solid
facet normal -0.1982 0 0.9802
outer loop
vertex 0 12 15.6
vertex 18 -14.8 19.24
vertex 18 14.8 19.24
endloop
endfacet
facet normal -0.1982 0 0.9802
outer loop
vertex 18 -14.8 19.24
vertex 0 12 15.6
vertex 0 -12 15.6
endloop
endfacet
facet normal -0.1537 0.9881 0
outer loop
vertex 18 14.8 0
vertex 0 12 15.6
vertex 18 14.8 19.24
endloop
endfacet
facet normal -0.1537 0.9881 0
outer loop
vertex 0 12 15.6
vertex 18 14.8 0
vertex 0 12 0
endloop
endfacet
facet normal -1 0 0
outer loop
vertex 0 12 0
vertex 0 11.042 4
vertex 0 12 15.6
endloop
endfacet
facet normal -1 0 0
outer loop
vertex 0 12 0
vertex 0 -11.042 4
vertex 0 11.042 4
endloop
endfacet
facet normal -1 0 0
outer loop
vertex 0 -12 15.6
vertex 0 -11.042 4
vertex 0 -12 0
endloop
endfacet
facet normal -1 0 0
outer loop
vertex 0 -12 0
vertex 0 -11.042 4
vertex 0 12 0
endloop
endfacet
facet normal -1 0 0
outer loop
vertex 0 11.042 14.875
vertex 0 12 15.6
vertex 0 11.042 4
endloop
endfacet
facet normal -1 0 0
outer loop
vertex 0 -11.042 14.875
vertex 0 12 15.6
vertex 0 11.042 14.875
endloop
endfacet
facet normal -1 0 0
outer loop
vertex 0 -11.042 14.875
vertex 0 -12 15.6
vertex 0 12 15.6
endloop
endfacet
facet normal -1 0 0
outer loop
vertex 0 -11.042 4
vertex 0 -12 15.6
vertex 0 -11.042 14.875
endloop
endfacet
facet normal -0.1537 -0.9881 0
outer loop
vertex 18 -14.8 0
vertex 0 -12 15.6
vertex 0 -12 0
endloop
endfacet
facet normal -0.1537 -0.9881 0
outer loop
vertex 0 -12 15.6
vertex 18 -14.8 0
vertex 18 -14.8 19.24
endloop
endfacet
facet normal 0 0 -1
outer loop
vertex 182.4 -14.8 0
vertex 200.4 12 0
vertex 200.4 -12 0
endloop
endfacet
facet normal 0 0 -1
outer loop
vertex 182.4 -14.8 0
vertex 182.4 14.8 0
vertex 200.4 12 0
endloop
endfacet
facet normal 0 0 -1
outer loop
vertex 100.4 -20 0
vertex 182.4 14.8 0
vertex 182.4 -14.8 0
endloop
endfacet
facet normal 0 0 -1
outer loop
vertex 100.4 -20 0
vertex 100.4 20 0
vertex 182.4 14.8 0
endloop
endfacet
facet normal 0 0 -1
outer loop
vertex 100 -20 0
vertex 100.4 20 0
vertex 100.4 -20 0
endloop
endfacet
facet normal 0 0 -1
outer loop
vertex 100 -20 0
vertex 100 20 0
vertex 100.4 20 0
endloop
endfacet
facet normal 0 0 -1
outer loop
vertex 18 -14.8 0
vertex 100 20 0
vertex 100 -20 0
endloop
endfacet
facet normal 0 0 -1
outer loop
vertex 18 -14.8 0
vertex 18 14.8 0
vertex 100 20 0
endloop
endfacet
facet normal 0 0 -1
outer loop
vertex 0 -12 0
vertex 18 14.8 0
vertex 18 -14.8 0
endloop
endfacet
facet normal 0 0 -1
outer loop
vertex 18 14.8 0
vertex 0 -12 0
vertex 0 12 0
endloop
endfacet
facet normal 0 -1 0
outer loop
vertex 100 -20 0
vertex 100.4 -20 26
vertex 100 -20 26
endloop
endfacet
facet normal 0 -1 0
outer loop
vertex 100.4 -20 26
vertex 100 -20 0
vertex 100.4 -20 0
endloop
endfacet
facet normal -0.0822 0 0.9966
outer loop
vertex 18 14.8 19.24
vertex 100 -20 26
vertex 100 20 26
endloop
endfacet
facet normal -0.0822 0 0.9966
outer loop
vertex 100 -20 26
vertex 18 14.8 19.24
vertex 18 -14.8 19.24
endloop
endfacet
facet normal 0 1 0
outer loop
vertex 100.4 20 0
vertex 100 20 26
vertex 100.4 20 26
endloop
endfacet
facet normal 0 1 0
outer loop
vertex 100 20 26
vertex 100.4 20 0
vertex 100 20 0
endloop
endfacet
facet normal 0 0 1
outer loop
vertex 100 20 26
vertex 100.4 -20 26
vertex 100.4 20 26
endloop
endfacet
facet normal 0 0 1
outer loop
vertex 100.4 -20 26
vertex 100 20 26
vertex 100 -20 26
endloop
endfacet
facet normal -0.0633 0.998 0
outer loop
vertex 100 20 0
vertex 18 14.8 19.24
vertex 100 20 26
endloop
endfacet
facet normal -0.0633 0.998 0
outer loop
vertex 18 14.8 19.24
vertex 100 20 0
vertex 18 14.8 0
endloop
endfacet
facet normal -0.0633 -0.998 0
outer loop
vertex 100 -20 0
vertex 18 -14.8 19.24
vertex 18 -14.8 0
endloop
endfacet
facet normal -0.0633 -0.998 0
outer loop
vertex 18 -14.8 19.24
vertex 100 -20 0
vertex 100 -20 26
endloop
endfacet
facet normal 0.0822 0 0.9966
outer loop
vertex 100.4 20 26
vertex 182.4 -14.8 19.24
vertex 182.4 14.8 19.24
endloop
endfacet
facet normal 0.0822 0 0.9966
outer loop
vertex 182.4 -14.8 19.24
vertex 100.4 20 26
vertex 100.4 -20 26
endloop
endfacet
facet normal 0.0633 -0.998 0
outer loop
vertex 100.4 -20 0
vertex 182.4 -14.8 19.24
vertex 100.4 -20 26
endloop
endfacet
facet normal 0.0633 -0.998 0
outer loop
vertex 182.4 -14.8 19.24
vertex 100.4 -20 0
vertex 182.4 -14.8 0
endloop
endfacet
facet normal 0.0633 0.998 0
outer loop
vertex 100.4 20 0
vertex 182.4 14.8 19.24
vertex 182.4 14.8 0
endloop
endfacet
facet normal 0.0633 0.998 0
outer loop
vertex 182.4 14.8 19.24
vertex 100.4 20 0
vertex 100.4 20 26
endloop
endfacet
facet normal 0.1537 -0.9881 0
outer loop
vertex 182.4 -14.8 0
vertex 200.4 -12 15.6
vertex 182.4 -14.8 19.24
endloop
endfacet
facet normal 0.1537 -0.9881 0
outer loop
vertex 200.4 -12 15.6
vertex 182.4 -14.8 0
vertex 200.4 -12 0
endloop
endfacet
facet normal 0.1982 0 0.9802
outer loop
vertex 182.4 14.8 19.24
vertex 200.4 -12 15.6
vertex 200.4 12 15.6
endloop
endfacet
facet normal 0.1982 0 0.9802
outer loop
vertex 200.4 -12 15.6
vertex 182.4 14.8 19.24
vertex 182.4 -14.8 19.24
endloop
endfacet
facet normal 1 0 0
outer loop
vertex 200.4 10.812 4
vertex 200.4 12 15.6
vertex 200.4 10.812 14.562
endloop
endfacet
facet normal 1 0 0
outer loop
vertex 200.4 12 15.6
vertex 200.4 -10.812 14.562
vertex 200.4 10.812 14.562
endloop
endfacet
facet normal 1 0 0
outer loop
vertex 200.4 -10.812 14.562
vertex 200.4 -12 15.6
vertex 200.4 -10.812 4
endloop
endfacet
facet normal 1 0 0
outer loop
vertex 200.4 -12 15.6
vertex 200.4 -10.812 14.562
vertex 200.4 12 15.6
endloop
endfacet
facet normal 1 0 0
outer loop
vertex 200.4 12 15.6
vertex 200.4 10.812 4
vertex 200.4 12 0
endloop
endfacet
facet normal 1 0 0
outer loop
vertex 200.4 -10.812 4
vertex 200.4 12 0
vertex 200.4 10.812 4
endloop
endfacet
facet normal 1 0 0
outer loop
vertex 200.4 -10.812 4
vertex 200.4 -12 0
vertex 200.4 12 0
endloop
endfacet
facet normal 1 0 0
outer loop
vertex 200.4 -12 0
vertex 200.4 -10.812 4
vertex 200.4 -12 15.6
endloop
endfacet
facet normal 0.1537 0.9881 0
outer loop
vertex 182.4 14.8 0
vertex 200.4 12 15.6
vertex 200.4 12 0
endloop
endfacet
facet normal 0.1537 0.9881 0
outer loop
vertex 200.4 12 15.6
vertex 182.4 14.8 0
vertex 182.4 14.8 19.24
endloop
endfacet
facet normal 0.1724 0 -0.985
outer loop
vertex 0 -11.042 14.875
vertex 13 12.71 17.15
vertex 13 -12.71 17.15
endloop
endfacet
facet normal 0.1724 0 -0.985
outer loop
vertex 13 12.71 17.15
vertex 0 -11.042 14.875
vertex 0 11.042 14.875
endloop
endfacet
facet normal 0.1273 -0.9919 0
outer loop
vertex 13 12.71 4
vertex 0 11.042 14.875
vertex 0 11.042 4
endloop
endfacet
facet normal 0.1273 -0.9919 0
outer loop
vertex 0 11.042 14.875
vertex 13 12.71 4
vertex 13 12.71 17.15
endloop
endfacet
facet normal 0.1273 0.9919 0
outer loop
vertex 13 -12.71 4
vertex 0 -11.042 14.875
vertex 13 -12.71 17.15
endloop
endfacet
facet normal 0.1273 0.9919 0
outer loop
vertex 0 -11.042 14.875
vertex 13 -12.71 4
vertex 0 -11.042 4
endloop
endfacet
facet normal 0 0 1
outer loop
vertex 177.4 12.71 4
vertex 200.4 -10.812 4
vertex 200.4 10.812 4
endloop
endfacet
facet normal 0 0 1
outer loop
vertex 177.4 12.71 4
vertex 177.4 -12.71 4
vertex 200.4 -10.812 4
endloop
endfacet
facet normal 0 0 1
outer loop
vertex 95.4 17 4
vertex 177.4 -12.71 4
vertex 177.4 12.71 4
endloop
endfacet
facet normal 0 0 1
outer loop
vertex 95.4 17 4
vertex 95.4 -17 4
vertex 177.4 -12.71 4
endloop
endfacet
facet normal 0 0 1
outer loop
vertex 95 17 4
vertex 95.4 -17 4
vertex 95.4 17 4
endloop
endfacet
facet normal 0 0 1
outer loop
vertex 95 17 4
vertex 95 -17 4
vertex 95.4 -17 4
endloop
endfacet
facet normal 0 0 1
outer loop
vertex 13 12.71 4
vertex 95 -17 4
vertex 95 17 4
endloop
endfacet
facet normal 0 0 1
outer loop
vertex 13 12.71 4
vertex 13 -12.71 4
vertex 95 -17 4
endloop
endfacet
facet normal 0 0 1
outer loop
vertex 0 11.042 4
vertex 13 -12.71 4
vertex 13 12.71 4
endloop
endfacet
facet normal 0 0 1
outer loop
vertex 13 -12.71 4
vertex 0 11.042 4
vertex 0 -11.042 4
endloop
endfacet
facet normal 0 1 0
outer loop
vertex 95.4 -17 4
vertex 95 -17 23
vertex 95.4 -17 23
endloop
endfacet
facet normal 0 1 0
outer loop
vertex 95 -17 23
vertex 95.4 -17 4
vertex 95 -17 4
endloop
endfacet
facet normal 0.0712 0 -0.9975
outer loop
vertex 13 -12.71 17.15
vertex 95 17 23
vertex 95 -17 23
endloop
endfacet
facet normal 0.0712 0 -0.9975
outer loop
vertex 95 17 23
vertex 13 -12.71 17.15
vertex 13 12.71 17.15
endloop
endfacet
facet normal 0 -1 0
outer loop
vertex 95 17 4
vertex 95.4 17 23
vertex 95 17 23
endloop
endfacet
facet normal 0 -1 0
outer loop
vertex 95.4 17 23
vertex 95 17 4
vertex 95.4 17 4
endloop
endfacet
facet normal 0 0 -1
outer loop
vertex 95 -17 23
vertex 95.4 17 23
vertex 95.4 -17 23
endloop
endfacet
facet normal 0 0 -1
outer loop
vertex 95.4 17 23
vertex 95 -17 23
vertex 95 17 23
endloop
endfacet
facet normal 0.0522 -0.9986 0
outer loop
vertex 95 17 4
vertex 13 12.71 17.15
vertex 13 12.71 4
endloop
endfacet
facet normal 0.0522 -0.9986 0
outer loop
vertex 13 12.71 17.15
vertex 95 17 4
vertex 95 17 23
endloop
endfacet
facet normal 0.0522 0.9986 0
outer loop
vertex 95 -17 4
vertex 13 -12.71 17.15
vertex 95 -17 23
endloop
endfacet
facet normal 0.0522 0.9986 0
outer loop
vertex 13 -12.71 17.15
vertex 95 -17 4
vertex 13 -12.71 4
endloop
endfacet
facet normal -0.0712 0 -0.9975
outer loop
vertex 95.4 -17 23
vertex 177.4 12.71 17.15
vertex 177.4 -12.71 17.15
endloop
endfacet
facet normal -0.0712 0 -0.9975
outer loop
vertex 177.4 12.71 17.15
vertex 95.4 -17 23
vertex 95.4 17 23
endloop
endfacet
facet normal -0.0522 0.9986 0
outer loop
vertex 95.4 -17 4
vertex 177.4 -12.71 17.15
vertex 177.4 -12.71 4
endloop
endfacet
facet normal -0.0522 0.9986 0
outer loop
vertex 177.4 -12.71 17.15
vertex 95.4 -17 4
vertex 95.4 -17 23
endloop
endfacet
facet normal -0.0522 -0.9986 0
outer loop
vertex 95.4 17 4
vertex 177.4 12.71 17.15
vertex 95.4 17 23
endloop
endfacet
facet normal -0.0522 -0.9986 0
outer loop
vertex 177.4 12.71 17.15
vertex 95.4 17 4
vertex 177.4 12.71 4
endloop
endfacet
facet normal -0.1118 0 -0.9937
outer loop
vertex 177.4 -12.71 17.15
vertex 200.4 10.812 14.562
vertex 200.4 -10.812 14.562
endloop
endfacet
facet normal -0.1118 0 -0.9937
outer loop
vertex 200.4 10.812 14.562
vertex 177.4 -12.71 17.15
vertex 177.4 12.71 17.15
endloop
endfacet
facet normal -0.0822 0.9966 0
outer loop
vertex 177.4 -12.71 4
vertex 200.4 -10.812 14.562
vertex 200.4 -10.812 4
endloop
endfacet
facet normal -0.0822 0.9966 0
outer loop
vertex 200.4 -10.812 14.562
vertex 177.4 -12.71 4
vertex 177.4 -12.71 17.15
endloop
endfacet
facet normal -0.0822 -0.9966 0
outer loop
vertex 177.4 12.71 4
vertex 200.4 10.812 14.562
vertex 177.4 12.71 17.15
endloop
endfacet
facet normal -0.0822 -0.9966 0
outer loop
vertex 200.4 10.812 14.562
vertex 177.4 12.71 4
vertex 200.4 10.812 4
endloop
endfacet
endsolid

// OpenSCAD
$fn = 32;

// ----------------------------------------------------------------------
// Faired channel: 200 x 40 x 26 mm, 3 mm walls, faired ends
// ----------------------------------------------------------------------

// --- parameters (mm) ---
length = 200;             // channel length
width = 40;               // channel width at mid length
height = 26;              // channel height at mid length
wall = 3;                 // side wall thickness
floor_t = 4;              // floor thickness
end_w = 24;               // faired end width
end_h = 15.6;             // faired end height

difference() {
  union() {
    hull() {
      translate([0, -12, 0]) cube([0.4, 24, 15.6]);
      translate([18, -14.8, 0]) cube([0.4, 29.6, 19.24]);
    }
    hull() {
      translate([18, -14.8, 0]) cube([0.4, 29.6, 19.24]);
      translate([100, -20, 0]) cube([0.4, 40, 26]);
    }
    hull() {
      translate([100, -20, 0]) cube([0.4, 40, 26]);
      translate([182, -14.8, 0]) cube([0.4, 29.6, 19.24]);
    }
    hull() {
      translate([182, -14.8, 0]) cube([0.4, 29.6, 19.24]);
      translate([200, -12, 0]) cube([0.4, 24, 15.6]);
    }
  }
  /* cavity, 5 mm proud of both ends so the ports are cut clean */
  hull() {
    translate([-5, -10.4, 4]) cube([0.4, 20.8, 10]);
    translate([13, -12.71, 4]) cube([0.4, 25.42, 13.15]);
  }
  hull() {
    translate([13, -12.71, 4]) cube([0.4, 25.42, 13.15]);
    translate([95, -17, 4]) cube([0.4, 34, 19]);
  }
  hull() {
    translate([95, -17, 4]) cube([0.4, 34, 19]);
    translate([177, -12.71, 4]) cube([0.4, 25.42, 13.15]);
  }
  hull() {
    translate([177, -12.71, 4]) cube([0.4, 25.42, 13.15]);
    translate([205, -10.4, 4]) cube([0.4, 20.8, 10]);
  }
}
